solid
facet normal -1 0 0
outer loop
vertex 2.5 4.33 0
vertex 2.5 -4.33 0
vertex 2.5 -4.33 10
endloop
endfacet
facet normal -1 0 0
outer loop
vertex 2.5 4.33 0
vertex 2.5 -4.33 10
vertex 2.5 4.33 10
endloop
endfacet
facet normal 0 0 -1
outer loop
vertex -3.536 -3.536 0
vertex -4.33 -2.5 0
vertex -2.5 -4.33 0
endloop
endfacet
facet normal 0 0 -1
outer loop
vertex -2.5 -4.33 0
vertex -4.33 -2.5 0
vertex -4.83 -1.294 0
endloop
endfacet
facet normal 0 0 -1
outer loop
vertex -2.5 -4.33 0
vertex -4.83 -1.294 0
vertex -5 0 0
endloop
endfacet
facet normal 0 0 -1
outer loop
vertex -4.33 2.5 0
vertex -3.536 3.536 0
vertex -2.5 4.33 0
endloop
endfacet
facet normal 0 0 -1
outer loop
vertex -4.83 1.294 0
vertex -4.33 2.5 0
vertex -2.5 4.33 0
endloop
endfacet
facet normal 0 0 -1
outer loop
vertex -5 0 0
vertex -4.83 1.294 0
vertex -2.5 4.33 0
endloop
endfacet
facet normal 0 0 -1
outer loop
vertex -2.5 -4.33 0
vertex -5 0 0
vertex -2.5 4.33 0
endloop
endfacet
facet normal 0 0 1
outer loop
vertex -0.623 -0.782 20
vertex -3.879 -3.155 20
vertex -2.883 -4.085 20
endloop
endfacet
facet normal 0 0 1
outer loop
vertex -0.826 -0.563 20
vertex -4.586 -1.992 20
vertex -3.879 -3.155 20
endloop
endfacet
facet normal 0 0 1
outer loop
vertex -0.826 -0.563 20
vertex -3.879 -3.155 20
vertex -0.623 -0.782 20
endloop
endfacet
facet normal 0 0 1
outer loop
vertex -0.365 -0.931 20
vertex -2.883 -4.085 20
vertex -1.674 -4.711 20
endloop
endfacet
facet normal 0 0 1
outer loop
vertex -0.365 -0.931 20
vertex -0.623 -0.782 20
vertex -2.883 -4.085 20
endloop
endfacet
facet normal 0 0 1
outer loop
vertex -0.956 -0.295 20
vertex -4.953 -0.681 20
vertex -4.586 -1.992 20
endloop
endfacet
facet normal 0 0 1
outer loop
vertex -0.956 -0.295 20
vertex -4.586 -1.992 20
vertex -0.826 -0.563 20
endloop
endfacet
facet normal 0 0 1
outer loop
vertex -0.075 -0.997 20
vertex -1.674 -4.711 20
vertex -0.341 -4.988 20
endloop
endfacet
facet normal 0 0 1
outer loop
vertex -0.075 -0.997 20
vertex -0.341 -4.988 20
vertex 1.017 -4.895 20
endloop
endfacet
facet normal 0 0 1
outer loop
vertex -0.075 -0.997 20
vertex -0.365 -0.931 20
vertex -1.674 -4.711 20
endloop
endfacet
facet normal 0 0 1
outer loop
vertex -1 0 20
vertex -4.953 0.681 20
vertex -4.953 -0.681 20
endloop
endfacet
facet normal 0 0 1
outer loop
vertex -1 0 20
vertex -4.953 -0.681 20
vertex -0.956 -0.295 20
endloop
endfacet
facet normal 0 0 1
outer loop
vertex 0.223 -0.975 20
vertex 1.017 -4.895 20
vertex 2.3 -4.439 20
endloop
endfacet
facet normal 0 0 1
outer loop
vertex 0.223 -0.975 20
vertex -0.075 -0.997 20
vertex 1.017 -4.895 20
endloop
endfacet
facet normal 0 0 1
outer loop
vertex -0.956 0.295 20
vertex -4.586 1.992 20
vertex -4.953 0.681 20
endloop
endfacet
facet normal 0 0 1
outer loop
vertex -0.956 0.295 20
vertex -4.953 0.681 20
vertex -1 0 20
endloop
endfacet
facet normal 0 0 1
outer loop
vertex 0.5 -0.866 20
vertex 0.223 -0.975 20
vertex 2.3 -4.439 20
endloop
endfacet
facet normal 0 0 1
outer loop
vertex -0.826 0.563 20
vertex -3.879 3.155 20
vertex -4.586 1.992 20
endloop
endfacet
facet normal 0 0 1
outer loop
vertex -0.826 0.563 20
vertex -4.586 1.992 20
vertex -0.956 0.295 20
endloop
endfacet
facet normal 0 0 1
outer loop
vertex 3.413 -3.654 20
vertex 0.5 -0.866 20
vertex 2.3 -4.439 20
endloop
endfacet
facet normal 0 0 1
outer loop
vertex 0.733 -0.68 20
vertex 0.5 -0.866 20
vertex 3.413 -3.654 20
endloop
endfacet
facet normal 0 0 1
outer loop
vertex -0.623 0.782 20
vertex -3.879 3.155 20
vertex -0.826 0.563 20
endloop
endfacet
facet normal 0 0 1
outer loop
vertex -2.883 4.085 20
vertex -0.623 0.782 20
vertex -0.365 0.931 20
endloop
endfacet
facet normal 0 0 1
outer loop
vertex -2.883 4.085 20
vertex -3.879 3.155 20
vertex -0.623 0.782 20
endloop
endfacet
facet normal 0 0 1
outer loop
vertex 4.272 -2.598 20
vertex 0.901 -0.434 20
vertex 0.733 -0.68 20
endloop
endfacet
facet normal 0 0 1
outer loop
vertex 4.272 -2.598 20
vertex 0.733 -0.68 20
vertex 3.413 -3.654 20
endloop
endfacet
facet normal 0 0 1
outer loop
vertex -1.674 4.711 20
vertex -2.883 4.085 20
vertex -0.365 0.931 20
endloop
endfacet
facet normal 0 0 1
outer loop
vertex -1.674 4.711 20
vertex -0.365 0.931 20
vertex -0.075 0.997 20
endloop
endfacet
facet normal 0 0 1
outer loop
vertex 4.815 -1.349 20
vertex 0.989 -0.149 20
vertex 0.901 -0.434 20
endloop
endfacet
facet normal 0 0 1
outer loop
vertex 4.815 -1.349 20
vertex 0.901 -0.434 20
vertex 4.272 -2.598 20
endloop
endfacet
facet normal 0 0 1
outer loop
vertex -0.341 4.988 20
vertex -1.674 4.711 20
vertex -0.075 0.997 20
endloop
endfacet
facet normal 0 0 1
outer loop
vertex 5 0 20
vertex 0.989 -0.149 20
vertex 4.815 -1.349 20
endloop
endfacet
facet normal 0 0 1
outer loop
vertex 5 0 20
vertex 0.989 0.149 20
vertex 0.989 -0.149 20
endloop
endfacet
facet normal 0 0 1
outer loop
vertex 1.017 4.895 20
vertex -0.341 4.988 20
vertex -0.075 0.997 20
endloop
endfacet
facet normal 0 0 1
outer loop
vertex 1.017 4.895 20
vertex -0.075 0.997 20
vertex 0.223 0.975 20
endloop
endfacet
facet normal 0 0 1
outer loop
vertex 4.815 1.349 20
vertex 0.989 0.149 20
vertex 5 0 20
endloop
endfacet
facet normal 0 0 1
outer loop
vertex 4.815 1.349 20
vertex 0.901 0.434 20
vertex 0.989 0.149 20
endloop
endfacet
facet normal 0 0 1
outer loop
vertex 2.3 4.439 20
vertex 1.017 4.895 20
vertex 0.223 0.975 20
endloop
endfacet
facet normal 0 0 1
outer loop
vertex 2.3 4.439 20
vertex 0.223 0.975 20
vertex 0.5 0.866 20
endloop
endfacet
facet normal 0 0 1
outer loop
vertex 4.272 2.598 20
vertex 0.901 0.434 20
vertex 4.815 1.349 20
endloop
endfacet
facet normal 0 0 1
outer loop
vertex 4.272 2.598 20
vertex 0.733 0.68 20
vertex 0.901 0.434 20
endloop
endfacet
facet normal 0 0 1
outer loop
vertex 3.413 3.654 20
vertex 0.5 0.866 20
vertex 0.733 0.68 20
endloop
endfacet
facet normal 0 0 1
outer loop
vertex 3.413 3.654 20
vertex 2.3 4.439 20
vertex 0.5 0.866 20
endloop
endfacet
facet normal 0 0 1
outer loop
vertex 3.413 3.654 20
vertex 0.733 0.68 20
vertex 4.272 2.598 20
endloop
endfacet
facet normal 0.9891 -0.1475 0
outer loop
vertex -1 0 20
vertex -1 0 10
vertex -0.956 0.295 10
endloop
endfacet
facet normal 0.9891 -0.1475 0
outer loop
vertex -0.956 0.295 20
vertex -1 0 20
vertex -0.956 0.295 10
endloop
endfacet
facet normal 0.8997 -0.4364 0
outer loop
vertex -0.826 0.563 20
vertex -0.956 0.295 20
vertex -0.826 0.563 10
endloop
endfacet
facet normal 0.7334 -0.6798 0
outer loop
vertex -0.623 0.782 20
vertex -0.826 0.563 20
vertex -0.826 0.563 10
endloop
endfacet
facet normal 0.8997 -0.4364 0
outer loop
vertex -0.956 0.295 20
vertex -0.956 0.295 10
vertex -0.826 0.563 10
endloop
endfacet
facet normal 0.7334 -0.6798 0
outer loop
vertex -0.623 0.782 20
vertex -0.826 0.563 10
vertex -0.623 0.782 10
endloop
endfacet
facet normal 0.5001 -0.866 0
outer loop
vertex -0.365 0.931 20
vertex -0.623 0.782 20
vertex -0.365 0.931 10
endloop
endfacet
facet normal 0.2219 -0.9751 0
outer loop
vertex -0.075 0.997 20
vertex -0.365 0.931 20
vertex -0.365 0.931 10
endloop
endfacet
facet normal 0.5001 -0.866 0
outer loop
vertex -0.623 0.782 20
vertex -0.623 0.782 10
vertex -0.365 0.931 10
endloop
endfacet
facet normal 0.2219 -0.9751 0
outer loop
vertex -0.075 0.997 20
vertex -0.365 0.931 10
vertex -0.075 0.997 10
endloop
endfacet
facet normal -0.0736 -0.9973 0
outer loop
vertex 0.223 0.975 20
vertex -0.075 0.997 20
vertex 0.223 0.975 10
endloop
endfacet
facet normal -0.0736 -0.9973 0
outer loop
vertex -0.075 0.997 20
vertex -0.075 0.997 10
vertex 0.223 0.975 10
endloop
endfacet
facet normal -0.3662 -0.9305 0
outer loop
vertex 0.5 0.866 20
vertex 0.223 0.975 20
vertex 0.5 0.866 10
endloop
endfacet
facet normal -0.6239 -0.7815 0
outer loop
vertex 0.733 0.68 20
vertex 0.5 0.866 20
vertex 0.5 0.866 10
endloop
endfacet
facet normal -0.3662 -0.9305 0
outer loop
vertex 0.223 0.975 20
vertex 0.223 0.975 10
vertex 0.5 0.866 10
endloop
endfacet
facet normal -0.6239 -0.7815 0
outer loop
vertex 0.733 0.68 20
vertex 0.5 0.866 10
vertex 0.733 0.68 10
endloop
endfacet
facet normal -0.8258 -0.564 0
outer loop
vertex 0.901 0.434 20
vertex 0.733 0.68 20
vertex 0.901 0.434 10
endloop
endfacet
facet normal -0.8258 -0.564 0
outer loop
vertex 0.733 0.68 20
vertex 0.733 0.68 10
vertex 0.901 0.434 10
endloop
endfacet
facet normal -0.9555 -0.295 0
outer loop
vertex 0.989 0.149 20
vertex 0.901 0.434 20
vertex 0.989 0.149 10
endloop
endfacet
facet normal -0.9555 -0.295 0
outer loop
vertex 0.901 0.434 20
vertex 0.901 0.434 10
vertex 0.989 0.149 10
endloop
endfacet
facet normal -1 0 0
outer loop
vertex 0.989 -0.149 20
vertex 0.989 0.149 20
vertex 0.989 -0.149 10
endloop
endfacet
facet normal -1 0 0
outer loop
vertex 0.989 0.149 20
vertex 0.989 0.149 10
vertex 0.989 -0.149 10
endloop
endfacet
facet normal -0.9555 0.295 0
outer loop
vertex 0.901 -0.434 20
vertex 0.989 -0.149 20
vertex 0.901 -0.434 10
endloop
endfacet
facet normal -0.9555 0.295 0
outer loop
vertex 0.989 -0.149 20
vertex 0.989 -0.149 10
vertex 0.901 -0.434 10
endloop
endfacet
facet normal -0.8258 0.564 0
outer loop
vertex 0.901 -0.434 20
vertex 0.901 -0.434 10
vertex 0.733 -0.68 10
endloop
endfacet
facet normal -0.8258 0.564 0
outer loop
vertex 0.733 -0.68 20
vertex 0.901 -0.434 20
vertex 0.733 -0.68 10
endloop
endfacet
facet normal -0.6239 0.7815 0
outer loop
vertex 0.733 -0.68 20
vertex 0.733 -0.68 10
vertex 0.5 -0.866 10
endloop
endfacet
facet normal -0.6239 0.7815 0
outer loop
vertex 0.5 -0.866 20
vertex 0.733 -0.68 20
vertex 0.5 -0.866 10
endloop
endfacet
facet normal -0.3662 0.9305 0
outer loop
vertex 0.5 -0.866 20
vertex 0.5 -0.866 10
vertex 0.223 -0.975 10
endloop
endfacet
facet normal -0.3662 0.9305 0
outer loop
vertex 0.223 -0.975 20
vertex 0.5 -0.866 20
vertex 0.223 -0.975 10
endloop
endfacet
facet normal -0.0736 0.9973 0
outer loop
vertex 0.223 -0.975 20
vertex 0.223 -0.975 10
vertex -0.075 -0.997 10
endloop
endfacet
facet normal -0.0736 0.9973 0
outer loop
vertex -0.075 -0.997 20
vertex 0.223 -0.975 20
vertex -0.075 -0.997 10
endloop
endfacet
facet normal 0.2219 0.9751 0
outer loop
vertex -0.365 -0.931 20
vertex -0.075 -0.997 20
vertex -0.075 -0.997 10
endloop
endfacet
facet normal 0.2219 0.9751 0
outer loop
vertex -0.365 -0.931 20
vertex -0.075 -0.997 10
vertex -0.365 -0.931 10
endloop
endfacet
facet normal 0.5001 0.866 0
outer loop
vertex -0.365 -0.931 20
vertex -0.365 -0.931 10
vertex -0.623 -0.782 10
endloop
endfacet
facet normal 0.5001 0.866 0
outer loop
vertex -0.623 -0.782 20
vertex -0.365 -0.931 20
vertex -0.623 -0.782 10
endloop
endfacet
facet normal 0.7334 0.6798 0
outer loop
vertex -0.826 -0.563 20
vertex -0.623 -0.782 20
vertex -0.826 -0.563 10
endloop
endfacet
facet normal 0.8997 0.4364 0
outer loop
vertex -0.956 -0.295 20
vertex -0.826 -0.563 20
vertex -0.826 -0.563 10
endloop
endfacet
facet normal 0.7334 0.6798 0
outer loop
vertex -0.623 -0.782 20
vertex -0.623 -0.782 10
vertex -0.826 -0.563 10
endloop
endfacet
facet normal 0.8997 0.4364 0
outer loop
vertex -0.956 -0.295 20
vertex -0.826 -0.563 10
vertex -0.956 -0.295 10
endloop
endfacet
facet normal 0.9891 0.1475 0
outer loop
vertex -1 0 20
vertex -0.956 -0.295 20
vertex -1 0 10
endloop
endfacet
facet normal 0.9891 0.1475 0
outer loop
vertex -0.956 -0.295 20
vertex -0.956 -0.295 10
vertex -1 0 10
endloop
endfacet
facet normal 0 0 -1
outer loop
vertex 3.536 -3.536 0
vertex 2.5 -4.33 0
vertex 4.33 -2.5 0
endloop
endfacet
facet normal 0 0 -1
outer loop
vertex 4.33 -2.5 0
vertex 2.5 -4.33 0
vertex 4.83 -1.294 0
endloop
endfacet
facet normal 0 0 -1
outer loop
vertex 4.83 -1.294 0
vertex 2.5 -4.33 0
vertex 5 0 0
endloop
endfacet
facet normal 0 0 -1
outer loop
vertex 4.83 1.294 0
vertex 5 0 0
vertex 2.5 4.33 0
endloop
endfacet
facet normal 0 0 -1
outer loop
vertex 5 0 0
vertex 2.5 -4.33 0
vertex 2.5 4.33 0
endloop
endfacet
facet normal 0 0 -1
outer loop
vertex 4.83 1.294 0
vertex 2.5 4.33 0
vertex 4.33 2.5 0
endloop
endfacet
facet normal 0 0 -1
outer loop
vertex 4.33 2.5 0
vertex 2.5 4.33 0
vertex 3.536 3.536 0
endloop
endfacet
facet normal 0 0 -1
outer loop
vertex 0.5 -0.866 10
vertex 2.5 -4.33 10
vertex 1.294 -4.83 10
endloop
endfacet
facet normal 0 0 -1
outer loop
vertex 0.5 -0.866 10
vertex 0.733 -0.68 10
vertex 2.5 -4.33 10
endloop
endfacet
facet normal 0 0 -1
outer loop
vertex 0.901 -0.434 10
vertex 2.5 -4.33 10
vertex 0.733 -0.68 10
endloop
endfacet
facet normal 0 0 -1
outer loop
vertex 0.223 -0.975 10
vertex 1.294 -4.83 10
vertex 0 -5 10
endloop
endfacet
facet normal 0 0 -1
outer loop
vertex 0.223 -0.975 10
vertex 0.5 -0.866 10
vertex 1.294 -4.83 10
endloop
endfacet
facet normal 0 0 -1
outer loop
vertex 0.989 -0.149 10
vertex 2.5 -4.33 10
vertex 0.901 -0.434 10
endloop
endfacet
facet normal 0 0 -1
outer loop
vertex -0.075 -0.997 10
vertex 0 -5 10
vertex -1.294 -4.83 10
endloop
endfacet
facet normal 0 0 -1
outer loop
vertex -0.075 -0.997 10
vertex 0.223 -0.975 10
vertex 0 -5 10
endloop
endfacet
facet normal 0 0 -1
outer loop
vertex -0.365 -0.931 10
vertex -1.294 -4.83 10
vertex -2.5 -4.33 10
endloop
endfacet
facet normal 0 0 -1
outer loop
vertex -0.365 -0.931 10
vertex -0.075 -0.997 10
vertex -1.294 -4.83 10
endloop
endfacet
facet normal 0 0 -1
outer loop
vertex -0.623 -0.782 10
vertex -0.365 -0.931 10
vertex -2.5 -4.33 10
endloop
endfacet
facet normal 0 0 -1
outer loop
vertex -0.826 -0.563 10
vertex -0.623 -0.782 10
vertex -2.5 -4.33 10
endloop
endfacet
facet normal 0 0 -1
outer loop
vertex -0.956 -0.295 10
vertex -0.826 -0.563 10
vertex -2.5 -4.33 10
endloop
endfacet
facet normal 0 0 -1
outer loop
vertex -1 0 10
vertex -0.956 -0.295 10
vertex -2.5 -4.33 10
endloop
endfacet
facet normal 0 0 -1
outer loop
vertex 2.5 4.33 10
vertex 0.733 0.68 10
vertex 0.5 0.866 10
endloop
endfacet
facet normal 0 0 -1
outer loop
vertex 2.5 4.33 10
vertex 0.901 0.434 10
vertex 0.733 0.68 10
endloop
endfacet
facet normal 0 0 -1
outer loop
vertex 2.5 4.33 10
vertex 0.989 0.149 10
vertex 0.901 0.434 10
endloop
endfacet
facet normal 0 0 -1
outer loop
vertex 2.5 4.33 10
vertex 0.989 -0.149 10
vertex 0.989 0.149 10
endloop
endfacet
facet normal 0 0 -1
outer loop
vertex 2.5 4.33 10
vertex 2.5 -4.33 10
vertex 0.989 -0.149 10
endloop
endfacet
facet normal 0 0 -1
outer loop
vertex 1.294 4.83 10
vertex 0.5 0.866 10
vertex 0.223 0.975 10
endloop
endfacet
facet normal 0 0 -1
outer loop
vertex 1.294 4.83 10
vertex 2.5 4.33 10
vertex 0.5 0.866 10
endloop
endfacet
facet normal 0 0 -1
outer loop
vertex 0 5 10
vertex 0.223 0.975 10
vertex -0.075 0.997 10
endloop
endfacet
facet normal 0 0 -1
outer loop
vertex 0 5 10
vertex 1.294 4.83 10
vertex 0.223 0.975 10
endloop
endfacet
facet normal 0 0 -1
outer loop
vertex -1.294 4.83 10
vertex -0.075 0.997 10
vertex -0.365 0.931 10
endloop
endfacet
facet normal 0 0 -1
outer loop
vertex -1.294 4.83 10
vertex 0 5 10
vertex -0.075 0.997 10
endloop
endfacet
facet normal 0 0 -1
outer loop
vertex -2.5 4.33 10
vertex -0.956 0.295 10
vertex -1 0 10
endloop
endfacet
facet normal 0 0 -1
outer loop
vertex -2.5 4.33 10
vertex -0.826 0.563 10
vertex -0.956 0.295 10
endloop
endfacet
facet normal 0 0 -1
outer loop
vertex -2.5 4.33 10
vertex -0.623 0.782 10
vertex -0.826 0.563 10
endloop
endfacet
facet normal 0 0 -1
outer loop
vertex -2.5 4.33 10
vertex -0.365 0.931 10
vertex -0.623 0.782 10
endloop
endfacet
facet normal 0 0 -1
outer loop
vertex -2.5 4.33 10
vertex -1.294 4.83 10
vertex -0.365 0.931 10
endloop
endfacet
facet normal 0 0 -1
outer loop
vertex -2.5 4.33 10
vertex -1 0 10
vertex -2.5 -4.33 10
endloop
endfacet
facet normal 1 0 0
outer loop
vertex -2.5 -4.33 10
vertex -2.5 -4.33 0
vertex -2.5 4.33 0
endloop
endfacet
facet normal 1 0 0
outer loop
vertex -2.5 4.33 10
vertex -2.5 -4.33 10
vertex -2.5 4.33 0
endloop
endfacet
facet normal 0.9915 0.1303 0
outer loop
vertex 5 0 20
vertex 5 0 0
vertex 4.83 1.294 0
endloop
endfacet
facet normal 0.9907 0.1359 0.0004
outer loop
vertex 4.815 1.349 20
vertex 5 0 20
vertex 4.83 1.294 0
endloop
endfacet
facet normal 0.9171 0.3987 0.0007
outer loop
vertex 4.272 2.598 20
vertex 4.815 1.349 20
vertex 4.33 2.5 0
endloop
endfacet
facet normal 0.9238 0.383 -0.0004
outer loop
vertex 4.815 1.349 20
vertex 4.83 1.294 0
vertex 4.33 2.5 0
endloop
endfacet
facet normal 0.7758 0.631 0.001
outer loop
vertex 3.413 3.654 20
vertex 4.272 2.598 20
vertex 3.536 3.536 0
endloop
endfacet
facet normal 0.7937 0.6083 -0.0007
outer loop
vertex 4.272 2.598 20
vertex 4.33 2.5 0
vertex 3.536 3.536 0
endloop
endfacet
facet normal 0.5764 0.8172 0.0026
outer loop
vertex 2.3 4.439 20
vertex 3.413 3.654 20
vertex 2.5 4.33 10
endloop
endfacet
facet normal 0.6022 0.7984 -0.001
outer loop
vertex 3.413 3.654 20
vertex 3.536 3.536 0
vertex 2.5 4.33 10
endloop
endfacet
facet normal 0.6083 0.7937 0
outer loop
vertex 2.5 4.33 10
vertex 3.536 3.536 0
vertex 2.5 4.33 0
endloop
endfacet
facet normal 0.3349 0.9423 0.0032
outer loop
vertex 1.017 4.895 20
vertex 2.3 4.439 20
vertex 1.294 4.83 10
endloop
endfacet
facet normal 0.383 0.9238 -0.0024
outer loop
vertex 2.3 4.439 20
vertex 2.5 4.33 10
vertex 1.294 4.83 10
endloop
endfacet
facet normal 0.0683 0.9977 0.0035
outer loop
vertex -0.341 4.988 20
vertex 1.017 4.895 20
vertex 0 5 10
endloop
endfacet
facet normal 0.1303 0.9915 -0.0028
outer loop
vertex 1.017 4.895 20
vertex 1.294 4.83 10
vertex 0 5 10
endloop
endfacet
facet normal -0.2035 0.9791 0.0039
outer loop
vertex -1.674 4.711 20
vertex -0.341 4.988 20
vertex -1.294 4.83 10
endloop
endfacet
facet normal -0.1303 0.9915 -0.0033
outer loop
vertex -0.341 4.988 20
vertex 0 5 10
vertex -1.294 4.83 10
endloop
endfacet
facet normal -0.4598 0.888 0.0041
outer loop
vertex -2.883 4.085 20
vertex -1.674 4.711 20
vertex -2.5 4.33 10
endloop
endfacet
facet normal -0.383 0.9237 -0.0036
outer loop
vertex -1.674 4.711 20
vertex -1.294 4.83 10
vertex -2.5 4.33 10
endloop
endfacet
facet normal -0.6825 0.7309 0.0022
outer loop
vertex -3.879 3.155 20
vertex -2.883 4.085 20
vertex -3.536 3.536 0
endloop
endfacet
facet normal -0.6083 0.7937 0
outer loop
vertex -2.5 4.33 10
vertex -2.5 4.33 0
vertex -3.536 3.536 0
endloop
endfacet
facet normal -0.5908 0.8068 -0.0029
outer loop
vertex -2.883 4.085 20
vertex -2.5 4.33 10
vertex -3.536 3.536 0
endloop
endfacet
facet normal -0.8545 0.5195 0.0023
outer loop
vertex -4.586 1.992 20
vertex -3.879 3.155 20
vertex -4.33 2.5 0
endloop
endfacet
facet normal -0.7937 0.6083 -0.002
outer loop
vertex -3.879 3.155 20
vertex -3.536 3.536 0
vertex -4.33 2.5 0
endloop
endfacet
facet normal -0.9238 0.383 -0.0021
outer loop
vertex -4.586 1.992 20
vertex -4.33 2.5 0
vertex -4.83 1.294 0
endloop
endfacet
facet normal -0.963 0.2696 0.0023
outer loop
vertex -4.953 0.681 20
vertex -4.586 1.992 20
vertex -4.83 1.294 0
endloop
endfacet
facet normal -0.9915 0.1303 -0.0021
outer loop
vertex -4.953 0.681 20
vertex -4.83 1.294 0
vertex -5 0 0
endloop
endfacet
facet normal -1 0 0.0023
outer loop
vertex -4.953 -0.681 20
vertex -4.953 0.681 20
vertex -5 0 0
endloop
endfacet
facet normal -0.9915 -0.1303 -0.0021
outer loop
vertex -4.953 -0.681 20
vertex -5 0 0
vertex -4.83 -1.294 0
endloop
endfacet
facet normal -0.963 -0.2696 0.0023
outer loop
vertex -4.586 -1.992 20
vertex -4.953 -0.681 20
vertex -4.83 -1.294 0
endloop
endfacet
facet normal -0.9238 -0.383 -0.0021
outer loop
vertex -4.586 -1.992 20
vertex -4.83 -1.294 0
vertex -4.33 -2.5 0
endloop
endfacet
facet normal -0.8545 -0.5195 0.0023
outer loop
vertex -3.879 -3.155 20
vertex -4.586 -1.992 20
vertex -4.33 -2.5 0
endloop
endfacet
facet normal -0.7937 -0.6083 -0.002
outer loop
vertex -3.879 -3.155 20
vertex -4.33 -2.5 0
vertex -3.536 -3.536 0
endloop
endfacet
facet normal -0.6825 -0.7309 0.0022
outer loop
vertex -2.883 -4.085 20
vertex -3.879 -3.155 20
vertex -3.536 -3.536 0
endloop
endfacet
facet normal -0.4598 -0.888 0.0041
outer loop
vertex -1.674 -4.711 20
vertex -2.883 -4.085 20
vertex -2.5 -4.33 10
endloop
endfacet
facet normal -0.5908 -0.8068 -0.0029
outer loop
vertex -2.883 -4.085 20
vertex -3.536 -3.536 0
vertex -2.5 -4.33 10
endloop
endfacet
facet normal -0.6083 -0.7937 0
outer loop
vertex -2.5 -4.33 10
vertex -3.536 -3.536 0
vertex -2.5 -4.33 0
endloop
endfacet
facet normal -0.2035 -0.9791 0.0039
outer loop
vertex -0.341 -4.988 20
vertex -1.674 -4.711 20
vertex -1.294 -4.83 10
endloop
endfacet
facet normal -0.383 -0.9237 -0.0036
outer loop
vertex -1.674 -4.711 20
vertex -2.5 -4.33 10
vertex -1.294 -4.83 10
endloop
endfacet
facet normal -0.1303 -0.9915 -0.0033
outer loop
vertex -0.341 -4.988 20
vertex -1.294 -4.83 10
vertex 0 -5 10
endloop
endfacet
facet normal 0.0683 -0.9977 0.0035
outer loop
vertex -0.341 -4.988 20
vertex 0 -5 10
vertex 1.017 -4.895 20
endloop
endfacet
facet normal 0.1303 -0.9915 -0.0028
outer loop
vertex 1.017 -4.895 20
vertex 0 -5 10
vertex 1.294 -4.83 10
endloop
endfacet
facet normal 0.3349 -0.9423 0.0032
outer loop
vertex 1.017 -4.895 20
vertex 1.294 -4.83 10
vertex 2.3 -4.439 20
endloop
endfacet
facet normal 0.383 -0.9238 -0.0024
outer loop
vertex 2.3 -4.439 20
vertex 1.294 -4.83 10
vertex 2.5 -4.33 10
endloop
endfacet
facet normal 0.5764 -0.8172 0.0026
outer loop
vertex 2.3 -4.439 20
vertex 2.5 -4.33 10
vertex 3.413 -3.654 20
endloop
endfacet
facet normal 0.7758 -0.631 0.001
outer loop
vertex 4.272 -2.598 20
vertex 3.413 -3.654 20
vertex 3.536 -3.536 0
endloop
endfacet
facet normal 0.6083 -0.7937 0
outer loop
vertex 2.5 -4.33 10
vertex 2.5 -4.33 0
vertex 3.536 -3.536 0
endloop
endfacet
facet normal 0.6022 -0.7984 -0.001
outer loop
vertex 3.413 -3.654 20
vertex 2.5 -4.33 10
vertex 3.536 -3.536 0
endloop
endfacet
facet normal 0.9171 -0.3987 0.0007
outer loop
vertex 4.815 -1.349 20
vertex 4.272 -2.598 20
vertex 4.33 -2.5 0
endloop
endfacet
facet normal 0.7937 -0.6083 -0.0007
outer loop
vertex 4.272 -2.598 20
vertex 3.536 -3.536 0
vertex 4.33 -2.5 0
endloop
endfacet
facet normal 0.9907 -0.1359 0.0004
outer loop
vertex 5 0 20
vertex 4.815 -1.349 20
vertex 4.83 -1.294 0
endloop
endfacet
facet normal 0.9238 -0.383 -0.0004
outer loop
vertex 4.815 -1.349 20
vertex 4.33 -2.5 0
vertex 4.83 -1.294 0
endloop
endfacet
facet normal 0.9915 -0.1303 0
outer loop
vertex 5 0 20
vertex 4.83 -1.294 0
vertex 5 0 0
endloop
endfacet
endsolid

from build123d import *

# Parameters (mm, degrees)
CROQUIS1_R              = 5
SALIENTE_EXTRUIR1_DEPTH = 20
CROQUIS3_W              = 5
CROQUIS3_H              = 10
CORTAR_EXTRUIR1_DEPTH   = 10
CROQUIS4_R              = 1
CORTAR_EXTRUIR2_DEPTH   = 10


with BuildPart() as part:
    # Croquis1 → Saliente-Extruir1 (new body)
    with BuildSketch(Plane.XY):
        Circle(CROQUIS1_R)
    extrude(amount=SALIENTE_EXTRUIR1_DEPTH)

    # Croquis3 → Cortar-Extruir1 (cut)
    with BuildSketch(Plane(origin=(0, 0, 0), x_dir=(-1, 0, 0), z_dir=(0, 0, -1))):
        Rectangle(CROQUIS3_W, CROQUIS3_H)
    extrude(amount=-CORTAR_EXTRUIR1_DEPTH, mode=Mode.SUBTRACT)

    # Croquis4 → Cortar-Extruir2 (cut)
    with BuildSketch(Plane(origin=(2.5, -4.330127019, 10), x_dir=(-1, 0, 0), z_dir=(0, 0, -1))):
        with Locations((2.5, 4.330127019)):
            Circle(CROQUIS4_R)
    extrude(amount=-CORTAR_EXTRUIR2_DEPTH, mode=Mode.SUBTRACT)


solid = part.part
